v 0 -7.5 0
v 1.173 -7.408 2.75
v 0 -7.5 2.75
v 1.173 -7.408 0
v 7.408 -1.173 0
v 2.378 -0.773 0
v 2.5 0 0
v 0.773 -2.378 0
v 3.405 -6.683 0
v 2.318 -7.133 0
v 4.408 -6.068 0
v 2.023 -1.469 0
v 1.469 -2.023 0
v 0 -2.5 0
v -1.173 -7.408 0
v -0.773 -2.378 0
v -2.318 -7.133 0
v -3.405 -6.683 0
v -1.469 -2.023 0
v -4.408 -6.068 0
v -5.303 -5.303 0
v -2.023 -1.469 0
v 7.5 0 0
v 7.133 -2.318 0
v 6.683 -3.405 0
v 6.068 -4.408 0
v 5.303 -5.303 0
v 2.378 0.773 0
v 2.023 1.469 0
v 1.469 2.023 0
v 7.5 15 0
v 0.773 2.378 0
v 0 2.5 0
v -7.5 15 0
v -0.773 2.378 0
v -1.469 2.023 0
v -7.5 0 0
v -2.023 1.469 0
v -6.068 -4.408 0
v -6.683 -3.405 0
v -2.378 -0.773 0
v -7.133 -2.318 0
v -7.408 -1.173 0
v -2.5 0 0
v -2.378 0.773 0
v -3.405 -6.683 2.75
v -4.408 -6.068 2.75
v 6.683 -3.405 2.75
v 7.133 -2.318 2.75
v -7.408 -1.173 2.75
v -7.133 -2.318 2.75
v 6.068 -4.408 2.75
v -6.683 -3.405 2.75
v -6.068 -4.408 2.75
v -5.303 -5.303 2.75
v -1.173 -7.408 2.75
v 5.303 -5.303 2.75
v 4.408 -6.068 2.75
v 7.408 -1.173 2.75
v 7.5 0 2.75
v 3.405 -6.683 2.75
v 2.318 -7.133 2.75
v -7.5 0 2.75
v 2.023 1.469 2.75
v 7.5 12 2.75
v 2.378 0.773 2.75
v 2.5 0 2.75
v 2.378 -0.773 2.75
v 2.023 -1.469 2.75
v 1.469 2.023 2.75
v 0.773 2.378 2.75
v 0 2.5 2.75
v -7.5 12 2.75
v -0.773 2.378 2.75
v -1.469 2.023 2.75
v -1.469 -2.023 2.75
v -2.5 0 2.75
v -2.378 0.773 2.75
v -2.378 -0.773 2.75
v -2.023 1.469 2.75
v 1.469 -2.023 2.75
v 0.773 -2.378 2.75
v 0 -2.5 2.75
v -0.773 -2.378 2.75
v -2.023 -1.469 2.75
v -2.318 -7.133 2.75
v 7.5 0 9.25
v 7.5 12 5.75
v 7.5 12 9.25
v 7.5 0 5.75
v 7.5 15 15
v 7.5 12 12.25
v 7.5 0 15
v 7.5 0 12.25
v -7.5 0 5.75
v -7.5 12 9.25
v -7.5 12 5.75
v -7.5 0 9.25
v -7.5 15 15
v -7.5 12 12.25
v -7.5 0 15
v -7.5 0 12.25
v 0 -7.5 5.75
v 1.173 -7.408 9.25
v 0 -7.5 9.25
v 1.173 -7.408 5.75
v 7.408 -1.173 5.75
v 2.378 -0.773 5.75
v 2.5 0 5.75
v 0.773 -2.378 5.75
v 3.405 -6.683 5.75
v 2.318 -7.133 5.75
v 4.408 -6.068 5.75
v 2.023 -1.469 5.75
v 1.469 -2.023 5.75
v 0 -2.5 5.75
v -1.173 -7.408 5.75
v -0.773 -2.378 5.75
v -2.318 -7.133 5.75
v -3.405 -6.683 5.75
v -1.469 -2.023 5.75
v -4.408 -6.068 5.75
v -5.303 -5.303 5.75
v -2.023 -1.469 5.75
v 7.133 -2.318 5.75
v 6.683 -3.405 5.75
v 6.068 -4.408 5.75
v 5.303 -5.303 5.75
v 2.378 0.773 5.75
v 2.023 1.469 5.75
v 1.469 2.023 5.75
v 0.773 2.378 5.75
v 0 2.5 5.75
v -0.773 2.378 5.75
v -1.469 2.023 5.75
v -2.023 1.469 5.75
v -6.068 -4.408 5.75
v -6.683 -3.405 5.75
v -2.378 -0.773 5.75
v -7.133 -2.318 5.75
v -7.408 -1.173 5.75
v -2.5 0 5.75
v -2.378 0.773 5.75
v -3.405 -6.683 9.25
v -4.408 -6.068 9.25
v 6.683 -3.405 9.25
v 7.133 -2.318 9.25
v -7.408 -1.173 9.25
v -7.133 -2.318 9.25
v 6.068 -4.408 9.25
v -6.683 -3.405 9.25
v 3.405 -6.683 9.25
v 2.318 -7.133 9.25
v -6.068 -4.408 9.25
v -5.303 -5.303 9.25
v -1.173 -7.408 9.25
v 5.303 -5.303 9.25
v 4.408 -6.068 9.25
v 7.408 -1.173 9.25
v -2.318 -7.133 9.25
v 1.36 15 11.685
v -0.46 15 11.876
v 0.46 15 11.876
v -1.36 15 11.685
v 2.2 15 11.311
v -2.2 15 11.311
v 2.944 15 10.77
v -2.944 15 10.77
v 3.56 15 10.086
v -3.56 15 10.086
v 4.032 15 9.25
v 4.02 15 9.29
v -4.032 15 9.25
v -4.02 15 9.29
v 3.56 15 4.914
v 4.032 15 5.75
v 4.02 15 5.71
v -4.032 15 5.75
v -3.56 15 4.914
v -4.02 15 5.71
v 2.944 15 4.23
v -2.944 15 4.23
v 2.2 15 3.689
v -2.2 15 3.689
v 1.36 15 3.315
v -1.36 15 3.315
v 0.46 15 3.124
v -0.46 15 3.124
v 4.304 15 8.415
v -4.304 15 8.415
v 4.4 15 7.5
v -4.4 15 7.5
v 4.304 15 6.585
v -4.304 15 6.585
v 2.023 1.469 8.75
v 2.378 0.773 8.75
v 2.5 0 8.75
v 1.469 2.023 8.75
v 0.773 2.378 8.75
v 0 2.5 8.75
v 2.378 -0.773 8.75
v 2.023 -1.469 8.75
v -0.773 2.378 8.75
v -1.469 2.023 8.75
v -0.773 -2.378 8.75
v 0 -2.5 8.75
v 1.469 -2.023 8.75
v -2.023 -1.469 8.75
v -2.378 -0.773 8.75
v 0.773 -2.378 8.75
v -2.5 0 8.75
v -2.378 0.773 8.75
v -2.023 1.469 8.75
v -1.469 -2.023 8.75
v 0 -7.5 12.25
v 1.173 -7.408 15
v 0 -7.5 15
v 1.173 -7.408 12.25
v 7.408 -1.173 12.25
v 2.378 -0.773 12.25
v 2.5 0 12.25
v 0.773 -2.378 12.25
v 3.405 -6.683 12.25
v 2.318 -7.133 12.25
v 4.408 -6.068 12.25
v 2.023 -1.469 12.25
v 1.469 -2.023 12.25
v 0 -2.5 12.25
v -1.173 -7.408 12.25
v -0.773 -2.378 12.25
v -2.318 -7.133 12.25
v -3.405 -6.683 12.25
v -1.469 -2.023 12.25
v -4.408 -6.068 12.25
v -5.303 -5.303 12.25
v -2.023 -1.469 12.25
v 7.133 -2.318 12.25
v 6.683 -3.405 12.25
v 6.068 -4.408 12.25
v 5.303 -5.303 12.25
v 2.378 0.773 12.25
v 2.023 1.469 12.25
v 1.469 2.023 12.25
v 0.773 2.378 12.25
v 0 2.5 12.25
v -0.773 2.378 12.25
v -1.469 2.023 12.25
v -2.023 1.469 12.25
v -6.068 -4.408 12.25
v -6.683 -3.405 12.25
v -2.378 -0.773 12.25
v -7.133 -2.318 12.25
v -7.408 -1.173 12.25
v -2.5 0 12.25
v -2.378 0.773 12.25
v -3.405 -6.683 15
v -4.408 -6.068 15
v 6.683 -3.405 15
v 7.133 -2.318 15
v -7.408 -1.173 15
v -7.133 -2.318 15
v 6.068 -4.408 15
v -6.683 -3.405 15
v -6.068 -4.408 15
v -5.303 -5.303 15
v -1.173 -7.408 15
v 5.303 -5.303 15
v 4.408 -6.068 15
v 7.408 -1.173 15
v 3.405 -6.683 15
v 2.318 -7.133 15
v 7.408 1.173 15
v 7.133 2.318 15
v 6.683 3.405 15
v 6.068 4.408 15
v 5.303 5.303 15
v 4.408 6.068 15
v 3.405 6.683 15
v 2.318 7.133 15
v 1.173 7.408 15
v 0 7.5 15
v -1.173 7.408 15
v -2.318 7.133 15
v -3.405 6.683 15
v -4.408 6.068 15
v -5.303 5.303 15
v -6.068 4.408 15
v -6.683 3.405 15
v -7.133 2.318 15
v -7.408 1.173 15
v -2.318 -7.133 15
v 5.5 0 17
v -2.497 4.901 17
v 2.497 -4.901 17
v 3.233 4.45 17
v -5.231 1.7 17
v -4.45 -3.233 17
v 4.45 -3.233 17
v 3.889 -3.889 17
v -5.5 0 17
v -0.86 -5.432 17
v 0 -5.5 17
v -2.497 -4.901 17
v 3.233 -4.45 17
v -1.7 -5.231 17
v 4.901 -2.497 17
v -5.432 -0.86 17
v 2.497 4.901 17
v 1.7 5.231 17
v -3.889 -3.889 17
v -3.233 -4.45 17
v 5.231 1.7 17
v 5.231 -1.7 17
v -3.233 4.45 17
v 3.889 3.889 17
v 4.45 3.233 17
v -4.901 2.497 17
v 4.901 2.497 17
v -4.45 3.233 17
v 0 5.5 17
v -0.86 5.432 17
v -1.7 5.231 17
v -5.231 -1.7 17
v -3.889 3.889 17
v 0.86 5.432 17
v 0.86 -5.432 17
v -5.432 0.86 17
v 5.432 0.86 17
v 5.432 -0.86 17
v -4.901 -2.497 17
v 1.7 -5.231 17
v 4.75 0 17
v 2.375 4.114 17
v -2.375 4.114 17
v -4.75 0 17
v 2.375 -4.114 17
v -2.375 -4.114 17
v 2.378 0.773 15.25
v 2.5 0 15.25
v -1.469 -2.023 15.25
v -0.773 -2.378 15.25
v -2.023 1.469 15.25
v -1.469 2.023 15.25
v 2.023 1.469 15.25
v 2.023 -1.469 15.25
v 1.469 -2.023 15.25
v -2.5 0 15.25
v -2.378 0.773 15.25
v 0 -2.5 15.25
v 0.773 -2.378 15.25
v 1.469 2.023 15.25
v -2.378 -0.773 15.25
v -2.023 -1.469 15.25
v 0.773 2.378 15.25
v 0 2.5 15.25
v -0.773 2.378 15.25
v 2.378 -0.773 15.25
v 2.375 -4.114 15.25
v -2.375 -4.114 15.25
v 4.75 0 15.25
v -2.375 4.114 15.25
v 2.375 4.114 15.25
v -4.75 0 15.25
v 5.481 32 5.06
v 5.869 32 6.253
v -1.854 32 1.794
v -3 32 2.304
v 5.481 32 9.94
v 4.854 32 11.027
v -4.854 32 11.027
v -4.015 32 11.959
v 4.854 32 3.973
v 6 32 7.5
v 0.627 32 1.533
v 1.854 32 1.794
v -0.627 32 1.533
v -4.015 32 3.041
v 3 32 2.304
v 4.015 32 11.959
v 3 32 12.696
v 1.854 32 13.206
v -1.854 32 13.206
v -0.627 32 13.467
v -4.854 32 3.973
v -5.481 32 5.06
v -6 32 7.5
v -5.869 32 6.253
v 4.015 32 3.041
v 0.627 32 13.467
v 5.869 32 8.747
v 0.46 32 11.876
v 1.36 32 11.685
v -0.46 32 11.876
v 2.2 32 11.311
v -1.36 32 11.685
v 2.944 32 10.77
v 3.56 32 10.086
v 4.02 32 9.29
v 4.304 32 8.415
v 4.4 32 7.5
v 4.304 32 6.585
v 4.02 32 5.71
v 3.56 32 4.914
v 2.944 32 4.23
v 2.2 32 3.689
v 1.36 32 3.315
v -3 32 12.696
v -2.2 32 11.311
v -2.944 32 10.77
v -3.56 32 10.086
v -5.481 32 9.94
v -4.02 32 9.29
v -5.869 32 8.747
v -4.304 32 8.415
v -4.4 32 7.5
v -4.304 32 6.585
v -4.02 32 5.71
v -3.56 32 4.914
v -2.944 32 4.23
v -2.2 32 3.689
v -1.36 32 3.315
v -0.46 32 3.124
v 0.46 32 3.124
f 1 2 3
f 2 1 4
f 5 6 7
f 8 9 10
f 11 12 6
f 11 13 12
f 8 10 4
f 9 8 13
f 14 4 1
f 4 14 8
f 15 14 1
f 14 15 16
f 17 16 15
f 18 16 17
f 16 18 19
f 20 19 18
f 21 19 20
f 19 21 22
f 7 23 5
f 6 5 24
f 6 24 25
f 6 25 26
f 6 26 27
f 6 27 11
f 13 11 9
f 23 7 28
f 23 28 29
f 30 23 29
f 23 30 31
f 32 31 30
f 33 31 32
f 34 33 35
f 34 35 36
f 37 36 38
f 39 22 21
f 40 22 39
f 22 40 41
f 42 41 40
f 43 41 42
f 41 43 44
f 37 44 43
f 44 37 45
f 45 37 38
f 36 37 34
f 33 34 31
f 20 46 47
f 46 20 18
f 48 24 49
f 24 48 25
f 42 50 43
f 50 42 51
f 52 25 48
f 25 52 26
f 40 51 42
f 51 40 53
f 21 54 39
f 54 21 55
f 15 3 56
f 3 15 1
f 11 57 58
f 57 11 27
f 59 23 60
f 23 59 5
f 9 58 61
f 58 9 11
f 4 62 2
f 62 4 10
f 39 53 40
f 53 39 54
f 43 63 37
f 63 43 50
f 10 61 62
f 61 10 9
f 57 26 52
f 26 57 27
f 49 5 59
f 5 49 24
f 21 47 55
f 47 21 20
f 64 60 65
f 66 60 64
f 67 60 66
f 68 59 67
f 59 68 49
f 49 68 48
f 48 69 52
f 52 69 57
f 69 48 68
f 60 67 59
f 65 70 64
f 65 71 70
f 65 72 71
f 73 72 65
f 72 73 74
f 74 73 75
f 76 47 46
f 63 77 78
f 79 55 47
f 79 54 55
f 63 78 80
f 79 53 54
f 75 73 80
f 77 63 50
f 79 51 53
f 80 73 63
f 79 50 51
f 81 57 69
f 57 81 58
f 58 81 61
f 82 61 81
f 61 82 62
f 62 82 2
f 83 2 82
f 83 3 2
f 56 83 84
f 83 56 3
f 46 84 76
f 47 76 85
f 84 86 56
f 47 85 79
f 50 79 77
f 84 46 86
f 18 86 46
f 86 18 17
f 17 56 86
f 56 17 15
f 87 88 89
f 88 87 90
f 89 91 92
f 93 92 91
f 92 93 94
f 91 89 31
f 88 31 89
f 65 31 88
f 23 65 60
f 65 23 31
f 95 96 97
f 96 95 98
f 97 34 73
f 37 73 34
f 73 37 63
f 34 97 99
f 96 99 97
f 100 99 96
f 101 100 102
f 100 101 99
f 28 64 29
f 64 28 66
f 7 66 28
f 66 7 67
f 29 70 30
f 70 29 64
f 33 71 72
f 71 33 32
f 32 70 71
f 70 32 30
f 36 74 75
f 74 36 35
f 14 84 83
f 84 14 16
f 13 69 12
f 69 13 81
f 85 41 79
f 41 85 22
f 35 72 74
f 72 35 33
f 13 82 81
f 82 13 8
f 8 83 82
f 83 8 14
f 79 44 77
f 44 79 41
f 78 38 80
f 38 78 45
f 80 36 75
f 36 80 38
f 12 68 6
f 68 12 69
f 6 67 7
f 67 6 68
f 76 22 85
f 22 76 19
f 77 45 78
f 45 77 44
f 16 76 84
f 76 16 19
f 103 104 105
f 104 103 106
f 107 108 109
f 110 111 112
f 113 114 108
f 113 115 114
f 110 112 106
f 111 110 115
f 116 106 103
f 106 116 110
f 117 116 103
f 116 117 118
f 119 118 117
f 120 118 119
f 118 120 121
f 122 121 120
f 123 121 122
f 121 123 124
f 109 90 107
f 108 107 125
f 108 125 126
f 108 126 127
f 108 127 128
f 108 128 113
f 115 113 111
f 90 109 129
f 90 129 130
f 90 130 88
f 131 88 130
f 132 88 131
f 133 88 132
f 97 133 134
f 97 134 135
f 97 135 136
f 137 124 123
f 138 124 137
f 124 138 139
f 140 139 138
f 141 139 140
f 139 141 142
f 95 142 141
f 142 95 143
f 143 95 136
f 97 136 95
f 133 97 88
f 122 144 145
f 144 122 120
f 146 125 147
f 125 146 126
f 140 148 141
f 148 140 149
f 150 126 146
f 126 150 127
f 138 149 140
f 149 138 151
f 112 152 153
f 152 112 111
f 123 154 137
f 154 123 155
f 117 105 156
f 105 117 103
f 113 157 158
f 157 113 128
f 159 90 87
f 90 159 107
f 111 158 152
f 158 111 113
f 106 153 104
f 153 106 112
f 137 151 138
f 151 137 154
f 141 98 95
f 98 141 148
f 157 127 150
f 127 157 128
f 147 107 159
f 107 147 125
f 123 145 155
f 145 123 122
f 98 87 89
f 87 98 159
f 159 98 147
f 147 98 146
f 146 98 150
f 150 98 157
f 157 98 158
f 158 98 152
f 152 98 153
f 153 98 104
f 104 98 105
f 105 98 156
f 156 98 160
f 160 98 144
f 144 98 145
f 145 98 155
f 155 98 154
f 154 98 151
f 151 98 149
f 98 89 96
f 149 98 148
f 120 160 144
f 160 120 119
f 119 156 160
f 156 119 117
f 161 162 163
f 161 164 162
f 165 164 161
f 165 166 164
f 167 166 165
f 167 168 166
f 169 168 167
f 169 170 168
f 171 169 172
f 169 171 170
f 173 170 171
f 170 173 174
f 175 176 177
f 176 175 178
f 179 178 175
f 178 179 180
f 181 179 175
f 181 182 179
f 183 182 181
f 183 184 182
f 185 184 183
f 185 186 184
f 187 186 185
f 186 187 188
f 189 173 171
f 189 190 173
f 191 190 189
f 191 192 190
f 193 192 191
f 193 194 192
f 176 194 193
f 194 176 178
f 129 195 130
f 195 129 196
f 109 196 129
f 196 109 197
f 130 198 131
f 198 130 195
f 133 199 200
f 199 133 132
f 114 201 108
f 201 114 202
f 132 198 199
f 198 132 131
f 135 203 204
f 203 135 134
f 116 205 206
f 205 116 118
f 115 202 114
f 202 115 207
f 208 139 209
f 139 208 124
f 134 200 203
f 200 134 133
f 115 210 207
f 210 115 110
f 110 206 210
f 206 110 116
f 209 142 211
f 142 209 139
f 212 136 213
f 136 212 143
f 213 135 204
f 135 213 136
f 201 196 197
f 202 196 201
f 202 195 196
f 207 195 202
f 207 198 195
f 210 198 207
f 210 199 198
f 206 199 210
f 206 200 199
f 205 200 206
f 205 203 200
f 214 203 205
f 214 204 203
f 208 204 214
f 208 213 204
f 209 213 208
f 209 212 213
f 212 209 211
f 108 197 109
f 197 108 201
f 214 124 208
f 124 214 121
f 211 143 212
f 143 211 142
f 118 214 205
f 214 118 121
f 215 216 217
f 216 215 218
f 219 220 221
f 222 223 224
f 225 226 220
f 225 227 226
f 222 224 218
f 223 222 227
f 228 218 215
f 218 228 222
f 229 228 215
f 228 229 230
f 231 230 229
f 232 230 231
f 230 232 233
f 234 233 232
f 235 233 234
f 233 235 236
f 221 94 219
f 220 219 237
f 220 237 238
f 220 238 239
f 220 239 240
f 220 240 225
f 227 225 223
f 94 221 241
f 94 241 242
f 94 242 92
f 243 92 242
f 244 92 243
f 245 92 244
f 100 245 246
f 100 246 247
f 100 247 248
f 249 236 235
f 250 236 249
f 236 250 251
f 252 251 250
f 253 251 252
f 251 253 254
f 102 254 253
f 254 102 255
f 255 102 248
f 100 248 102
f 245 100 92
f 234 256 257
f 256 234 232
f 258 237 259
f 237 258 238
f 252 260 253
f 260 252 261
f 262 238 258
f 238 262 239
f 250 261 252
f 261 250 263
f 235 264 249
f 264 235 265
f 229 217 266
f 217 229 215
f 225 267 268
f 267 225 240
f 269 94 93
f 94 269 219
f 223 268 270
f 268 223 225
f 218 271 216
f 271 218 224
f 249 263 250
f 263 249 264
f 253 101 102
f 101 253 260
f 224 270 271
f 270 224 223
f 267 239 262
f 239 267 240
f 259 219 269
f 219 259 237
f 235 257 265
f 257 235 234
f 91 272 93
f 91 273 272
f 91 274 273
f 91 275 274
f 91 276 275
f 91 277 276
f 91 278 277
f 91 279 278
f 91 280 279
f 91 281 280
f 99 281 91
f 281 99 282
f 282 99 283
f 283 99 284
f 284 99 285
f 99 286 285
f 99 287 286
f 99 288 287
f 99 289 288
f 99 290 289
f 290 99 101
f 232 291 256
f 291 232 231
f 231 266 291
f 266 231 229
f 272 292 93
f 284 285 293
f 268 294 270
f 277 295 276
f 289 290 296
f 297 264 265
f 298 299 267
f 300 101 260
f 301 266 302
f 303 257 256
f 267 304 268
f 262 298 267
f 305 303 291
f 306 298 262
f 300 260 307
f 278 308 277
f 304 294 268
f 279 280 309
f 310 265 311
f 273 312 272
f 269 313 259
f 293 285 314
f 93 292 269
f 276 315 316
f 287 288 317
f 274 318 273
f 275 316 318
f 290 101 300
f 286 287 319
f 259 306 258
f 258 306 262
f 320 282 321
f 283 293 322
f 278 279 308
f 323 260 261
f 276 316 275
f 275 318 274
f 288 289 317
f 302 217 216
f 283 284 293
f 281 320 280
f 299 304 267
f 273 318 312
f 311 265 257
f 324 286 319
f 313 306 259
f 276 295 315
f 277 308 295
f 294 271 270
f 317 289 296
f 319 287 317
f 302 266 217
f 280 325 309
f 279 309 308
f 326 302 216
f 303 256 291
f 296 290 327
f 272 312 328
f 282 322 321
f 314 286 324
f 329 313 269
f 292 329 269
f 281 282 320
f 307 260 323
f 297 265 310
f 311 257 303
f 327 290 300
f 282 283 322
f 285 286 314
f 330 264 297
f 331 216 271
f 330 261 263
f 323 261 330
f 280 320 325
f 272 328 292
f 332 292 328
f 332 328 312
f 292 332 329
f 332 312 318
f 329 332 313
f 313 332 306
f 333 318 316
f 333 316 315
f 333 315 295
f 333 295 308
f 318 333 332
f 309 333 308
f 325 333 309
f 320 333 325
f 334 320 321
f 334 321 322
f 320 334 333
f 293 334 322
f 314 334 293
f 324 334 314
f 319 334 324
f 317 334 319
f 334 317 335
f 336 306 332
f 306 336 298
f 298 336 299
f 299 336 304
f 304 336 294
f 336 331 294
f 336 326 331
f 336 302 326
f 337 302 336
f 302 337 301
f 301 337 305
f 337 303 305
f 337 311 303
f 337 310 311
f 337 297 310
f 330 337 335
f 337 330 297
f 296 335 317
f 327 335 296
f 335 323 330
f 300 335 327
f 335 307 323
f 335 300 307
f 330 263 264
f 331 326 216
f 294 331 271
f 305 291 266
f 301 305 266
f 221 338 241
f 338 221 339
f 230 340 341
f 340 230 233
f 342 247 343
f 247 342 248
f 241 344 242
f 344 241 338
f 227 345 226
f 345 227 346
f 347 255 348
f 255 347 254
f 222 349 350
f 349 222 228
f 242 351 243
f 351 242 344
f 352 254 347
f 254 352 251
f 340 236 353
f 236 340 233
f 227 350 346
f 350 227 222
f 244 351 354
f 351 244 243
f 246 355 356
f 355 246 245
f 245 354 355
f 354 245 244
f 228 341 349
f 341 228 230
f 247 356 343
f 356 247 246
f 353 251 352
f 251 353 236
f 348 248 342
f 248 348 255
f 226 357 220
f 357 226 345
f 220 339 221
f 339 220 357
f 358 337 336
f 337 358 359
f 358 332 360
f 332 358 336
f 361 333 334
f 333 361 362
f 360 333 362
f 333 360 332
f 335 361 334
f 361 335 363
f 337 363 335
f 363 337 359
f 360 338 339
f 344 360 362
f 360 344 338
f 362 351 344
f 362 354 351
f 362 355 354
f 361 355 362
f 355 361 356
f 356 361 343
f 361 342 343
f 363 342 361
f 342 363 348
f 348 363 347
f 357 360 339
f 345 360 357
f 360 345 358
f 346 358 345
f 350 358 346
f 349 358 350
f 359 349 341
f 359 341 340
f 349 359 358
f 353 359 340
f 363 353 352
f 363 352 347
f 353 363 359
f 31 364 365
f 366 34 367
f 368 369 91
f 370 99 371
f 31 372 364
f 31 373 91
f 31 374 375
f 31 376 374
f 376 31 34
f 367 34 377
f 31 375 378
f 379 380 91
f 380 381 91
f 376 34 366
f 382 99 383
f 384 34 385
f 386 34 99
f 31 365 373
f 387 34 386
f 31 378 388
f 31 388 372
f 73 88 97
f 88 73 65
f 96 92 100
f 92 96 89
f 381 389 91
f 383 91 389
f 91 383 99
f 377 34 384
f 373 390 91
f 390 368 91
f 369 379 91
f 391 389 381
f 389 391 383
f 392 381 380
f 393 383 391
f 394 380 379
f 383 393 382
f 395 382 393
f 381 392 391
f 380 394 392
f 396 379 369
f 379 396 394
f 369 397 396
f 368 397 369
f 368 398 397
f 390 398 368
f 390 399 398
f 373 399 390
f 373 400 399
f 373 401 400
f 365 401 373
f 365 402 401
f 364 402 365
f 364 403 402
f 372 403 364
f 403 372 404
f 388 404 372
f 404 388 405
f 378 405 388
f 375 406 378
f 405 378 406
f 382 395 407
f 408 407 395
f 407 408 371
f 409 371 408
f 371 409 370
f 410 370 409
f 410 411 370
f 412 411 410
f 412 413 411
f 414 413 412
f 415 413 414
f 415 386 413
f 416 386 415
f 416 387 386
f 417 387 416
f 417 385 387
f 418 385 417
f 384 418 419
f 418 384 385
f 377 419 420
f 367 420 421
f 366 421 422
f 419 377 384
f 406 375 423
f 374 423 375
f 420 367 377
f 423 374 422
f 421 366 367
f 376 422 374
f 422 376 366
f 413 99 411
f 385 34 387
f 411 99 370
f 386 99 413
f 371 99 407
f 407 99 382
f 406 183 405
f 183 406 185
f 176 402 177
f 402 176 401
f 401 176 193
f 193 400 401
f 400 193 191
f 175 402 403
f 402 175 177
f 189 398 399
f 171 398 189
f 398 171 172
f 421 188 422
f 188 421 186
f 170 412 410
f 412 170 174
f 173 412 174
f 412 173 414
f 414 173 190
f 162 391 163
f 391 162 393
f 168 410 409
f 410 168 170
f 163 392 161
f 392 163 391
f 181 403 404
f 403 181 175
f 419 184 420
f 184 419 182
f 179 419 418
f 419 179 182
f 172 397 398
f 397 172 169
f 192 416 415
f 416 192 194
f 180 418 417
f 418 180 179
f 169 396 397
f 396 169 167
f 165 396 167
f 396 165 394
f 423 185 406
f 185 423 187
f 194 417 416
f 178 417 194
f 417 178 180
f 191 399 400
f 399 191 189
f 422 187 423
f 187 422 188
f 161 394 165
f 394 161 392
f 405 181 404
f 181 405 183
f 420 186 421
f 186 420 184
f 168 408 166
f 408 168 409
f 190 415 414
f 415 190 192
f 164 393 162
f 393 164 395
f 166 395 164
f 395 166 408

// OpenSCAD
difference(){
union(){
cylinder(r=7.5,h=2.75,$fn=40);
translate([-7.5,0,0])cube([15,15,2.75]);
}
cylinder(d=5,h=3,$fn=20);
}

translate([0,0,5.75])
difference(){
union(){
cylinder(r=7.5,h=3.5,$fn=40);
translate([-7.5,0,0])cube([15,15,3.5]);
}
cylinder(d=5,h=3,$fn=20);
}

translate([0,0,12.25])
difference(){
union(){
cylinder(r=7.5,h=2.75,$fn=40);
translate([0,0,2.75])cylinder(r1=7.5,r2=5.5,h=2,$fn=40);    
translate([-7.5,0,0])cube([15,15,2.75]);
}
cylinder(d=5,h=6,$fn=20);
translate([0,0,3])cylinder(d=9.5,h=3,$fn=6);
}
difference(){
hull(){
translate([-7.5,12,0])cube([15,3,15]);
translate([0,12,7.5])rotate([-90,0,0])
cylinder(d=12,h=20,$fn=30);
}
translate([0,15,7.5])rotate([-90,0,0])
cylinder(d=8.8,h=20,$fn=30);
}
